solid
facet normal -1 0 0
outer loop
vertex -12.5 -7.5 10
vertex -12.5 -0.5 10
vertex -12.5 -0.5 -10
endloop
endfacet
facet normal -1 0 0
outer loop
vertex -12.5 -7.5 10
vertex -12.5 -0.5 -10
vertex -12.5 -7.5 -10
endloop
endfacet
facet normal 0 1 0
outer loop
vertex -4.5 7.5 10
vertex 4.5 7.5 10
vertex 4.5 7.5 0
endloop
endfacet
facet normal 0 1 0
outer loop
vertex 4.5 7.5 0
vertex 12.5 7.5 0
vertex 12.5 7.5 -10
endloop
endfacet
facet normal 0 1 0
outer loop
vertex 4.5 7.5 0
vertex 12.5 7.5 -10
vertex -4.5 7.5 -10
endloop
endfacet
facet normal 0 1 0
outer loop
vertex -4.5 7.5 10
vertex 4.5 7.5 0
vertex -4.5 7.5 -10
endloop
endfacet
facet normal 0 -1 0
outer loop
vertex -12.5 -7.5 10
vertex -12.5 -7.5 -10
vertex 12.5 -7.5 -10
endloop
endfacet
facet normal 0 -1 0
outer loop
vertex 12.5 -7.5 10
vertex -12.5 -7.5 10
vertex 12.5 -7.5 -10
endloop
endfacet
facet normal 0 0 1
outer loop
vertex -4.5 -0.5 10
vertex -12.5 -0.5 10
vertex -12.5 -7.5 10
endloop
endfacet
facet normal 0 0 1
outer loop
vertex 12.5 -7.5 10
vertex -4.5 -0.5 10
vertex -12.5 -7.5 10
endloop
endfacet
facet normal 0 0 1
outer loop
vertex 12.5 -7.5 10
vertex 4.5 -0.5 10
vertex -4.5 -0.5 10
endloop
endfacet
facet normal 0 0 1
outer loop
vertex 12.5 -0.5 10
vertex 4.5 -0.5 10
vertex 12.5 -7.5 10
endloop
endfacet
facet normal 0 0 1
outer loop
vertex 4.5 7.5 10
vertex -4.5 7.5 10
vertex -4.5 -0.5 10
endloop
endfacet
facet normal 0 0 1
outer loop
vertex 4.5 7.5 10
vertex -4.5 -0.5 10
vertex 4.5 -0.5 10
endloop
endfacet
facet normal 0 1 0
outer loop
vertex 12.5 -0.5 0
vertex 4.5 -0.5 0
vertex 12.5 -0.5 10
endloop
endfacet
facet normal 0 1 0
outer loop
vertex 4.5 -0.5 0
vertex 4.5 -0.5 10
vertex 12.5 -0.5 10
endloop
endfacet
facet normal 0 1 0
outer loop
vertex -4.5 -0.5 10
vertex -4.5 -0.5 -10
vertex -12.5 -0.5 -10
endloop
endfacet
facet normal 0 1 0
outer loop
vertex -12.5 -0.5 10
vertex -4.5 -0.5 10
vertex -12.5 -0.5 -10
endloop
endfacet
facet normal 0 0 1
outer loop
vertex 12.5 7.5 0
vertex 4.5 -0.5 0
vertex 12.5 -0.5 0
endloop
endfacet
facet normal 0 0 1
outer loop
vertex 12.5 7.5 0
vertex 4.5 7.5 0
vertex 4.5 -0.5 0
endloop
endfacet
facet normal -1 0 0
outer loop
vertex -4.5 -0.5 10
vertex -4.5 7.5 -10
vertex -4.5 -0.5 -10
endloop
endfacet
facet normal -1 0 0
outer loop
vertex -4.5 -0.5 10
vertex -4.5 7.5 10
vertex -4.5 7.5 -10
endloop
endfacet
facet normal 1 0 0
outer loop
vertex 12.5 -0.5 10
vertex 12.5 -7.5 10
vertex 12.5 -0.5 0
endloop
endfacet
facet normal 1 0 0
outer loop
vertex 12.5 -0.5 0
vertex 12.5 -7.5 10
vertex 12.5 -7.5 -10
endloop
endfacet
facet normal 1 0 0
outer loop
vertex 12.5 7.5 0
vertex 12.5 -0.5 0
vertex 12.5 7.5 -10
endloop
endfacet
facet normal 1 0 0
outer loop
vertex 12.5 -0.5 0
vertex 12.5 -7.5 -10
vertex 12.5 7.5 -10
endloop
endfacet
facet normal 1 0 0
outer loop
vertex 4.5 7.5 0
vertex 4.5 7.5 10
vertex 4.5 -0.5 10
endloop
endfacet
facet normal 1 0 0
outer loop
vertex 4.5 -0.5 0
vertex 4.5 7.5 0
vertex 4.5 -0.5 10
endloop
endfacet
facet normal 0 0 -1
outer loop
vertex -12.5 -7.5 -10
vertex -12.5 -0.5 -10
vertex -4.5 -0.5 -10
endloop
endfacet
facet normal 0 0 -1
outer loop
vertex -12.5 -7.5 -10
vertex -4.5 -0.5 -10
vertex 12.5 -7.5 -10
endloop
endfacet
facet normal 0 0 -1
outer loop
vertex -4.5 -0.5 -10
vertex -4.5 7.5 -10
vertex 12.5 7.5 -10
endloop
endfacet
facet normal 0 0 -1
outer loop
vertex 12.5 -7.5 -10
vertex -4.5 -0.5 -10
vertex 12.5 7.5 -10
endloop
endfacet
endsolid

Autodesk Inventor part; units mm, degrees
ref_plane "YZ Plane" through (0, 0, 0) normal (1, 0, 0) x (0, 1, 0)
ref_plane "XZ Plane" through (0, 0, 0) normal (0, 1, 0) x (-1, 0, 0)
ref_plane "XY Plane" through (0, 0, 0) normal (0, 0, 1) x (1, 0, 0)
sketch "草圖1" plane through (0, 0, 0) normal (0, 0, 1) x (1, 0, 0)
  line L0 (-12.5, -7.5) -> (12.5, -7.5)
  line L1 (12.5, -7.5) -> (12.5, 7.5)
  line L2 (12.5, 7.5) -> (-12.5, 7.5)
  line L3 (-12.5, 7.5) -> (-12.5, -7.5)
  line L4 (-12.5, -7.5) -> (12.5, 7.5) construction
  line L5 (12.5, -7.5) -> (-12.5, 7.5) construction
  point P0 (0, 0)
  dimension "d0" = 25
  dimension "d1" = 15
extrude "擠出1" add sketch "草圖1" along normal mid plane 20
sketch "草圖2" plane through (0, 0, 10) normal (0, 0, 1) x (1, 0, 0)
  line L0 (12.5, 7.5) -> (-12.5, 7.5) projected
  line L1 (-12.5, 7.5) -> (-4.5, 7.5)
  line L2 (-4.5, 7.5) -> (-4.5, -0.5)
  line L3 (-4.5, -0.5) -> (-12.5, -0.5)
  line L4 (-12.5, -0.5) -> (-12.5, 7.5)
  line L5 (12.5, 7.5) -> (4.5, 7.5)
  line L6 (4.5, 7.5) -> (4.5, -0.5)
  line L7 (4.5, -0.5) -> (12.5, -0.5)
  line L8 (12.5, -0.5) -> (12.5, 7.5)
  point P0 (0, 0)
  point P1 (-4.5, 7.5)
  dimension "d4" = 8
  dimension "d5" = 8
  dimension "d6" = 8
extrude "擠出2" cut sketch "草圖2" against normal blind 10 contours L8 L7 L6 L0
extrude "擠出3" cut sketch "草圖2" against normal blind 20 contours L2 L3 L4 L0
properties part number "視圖範例"
